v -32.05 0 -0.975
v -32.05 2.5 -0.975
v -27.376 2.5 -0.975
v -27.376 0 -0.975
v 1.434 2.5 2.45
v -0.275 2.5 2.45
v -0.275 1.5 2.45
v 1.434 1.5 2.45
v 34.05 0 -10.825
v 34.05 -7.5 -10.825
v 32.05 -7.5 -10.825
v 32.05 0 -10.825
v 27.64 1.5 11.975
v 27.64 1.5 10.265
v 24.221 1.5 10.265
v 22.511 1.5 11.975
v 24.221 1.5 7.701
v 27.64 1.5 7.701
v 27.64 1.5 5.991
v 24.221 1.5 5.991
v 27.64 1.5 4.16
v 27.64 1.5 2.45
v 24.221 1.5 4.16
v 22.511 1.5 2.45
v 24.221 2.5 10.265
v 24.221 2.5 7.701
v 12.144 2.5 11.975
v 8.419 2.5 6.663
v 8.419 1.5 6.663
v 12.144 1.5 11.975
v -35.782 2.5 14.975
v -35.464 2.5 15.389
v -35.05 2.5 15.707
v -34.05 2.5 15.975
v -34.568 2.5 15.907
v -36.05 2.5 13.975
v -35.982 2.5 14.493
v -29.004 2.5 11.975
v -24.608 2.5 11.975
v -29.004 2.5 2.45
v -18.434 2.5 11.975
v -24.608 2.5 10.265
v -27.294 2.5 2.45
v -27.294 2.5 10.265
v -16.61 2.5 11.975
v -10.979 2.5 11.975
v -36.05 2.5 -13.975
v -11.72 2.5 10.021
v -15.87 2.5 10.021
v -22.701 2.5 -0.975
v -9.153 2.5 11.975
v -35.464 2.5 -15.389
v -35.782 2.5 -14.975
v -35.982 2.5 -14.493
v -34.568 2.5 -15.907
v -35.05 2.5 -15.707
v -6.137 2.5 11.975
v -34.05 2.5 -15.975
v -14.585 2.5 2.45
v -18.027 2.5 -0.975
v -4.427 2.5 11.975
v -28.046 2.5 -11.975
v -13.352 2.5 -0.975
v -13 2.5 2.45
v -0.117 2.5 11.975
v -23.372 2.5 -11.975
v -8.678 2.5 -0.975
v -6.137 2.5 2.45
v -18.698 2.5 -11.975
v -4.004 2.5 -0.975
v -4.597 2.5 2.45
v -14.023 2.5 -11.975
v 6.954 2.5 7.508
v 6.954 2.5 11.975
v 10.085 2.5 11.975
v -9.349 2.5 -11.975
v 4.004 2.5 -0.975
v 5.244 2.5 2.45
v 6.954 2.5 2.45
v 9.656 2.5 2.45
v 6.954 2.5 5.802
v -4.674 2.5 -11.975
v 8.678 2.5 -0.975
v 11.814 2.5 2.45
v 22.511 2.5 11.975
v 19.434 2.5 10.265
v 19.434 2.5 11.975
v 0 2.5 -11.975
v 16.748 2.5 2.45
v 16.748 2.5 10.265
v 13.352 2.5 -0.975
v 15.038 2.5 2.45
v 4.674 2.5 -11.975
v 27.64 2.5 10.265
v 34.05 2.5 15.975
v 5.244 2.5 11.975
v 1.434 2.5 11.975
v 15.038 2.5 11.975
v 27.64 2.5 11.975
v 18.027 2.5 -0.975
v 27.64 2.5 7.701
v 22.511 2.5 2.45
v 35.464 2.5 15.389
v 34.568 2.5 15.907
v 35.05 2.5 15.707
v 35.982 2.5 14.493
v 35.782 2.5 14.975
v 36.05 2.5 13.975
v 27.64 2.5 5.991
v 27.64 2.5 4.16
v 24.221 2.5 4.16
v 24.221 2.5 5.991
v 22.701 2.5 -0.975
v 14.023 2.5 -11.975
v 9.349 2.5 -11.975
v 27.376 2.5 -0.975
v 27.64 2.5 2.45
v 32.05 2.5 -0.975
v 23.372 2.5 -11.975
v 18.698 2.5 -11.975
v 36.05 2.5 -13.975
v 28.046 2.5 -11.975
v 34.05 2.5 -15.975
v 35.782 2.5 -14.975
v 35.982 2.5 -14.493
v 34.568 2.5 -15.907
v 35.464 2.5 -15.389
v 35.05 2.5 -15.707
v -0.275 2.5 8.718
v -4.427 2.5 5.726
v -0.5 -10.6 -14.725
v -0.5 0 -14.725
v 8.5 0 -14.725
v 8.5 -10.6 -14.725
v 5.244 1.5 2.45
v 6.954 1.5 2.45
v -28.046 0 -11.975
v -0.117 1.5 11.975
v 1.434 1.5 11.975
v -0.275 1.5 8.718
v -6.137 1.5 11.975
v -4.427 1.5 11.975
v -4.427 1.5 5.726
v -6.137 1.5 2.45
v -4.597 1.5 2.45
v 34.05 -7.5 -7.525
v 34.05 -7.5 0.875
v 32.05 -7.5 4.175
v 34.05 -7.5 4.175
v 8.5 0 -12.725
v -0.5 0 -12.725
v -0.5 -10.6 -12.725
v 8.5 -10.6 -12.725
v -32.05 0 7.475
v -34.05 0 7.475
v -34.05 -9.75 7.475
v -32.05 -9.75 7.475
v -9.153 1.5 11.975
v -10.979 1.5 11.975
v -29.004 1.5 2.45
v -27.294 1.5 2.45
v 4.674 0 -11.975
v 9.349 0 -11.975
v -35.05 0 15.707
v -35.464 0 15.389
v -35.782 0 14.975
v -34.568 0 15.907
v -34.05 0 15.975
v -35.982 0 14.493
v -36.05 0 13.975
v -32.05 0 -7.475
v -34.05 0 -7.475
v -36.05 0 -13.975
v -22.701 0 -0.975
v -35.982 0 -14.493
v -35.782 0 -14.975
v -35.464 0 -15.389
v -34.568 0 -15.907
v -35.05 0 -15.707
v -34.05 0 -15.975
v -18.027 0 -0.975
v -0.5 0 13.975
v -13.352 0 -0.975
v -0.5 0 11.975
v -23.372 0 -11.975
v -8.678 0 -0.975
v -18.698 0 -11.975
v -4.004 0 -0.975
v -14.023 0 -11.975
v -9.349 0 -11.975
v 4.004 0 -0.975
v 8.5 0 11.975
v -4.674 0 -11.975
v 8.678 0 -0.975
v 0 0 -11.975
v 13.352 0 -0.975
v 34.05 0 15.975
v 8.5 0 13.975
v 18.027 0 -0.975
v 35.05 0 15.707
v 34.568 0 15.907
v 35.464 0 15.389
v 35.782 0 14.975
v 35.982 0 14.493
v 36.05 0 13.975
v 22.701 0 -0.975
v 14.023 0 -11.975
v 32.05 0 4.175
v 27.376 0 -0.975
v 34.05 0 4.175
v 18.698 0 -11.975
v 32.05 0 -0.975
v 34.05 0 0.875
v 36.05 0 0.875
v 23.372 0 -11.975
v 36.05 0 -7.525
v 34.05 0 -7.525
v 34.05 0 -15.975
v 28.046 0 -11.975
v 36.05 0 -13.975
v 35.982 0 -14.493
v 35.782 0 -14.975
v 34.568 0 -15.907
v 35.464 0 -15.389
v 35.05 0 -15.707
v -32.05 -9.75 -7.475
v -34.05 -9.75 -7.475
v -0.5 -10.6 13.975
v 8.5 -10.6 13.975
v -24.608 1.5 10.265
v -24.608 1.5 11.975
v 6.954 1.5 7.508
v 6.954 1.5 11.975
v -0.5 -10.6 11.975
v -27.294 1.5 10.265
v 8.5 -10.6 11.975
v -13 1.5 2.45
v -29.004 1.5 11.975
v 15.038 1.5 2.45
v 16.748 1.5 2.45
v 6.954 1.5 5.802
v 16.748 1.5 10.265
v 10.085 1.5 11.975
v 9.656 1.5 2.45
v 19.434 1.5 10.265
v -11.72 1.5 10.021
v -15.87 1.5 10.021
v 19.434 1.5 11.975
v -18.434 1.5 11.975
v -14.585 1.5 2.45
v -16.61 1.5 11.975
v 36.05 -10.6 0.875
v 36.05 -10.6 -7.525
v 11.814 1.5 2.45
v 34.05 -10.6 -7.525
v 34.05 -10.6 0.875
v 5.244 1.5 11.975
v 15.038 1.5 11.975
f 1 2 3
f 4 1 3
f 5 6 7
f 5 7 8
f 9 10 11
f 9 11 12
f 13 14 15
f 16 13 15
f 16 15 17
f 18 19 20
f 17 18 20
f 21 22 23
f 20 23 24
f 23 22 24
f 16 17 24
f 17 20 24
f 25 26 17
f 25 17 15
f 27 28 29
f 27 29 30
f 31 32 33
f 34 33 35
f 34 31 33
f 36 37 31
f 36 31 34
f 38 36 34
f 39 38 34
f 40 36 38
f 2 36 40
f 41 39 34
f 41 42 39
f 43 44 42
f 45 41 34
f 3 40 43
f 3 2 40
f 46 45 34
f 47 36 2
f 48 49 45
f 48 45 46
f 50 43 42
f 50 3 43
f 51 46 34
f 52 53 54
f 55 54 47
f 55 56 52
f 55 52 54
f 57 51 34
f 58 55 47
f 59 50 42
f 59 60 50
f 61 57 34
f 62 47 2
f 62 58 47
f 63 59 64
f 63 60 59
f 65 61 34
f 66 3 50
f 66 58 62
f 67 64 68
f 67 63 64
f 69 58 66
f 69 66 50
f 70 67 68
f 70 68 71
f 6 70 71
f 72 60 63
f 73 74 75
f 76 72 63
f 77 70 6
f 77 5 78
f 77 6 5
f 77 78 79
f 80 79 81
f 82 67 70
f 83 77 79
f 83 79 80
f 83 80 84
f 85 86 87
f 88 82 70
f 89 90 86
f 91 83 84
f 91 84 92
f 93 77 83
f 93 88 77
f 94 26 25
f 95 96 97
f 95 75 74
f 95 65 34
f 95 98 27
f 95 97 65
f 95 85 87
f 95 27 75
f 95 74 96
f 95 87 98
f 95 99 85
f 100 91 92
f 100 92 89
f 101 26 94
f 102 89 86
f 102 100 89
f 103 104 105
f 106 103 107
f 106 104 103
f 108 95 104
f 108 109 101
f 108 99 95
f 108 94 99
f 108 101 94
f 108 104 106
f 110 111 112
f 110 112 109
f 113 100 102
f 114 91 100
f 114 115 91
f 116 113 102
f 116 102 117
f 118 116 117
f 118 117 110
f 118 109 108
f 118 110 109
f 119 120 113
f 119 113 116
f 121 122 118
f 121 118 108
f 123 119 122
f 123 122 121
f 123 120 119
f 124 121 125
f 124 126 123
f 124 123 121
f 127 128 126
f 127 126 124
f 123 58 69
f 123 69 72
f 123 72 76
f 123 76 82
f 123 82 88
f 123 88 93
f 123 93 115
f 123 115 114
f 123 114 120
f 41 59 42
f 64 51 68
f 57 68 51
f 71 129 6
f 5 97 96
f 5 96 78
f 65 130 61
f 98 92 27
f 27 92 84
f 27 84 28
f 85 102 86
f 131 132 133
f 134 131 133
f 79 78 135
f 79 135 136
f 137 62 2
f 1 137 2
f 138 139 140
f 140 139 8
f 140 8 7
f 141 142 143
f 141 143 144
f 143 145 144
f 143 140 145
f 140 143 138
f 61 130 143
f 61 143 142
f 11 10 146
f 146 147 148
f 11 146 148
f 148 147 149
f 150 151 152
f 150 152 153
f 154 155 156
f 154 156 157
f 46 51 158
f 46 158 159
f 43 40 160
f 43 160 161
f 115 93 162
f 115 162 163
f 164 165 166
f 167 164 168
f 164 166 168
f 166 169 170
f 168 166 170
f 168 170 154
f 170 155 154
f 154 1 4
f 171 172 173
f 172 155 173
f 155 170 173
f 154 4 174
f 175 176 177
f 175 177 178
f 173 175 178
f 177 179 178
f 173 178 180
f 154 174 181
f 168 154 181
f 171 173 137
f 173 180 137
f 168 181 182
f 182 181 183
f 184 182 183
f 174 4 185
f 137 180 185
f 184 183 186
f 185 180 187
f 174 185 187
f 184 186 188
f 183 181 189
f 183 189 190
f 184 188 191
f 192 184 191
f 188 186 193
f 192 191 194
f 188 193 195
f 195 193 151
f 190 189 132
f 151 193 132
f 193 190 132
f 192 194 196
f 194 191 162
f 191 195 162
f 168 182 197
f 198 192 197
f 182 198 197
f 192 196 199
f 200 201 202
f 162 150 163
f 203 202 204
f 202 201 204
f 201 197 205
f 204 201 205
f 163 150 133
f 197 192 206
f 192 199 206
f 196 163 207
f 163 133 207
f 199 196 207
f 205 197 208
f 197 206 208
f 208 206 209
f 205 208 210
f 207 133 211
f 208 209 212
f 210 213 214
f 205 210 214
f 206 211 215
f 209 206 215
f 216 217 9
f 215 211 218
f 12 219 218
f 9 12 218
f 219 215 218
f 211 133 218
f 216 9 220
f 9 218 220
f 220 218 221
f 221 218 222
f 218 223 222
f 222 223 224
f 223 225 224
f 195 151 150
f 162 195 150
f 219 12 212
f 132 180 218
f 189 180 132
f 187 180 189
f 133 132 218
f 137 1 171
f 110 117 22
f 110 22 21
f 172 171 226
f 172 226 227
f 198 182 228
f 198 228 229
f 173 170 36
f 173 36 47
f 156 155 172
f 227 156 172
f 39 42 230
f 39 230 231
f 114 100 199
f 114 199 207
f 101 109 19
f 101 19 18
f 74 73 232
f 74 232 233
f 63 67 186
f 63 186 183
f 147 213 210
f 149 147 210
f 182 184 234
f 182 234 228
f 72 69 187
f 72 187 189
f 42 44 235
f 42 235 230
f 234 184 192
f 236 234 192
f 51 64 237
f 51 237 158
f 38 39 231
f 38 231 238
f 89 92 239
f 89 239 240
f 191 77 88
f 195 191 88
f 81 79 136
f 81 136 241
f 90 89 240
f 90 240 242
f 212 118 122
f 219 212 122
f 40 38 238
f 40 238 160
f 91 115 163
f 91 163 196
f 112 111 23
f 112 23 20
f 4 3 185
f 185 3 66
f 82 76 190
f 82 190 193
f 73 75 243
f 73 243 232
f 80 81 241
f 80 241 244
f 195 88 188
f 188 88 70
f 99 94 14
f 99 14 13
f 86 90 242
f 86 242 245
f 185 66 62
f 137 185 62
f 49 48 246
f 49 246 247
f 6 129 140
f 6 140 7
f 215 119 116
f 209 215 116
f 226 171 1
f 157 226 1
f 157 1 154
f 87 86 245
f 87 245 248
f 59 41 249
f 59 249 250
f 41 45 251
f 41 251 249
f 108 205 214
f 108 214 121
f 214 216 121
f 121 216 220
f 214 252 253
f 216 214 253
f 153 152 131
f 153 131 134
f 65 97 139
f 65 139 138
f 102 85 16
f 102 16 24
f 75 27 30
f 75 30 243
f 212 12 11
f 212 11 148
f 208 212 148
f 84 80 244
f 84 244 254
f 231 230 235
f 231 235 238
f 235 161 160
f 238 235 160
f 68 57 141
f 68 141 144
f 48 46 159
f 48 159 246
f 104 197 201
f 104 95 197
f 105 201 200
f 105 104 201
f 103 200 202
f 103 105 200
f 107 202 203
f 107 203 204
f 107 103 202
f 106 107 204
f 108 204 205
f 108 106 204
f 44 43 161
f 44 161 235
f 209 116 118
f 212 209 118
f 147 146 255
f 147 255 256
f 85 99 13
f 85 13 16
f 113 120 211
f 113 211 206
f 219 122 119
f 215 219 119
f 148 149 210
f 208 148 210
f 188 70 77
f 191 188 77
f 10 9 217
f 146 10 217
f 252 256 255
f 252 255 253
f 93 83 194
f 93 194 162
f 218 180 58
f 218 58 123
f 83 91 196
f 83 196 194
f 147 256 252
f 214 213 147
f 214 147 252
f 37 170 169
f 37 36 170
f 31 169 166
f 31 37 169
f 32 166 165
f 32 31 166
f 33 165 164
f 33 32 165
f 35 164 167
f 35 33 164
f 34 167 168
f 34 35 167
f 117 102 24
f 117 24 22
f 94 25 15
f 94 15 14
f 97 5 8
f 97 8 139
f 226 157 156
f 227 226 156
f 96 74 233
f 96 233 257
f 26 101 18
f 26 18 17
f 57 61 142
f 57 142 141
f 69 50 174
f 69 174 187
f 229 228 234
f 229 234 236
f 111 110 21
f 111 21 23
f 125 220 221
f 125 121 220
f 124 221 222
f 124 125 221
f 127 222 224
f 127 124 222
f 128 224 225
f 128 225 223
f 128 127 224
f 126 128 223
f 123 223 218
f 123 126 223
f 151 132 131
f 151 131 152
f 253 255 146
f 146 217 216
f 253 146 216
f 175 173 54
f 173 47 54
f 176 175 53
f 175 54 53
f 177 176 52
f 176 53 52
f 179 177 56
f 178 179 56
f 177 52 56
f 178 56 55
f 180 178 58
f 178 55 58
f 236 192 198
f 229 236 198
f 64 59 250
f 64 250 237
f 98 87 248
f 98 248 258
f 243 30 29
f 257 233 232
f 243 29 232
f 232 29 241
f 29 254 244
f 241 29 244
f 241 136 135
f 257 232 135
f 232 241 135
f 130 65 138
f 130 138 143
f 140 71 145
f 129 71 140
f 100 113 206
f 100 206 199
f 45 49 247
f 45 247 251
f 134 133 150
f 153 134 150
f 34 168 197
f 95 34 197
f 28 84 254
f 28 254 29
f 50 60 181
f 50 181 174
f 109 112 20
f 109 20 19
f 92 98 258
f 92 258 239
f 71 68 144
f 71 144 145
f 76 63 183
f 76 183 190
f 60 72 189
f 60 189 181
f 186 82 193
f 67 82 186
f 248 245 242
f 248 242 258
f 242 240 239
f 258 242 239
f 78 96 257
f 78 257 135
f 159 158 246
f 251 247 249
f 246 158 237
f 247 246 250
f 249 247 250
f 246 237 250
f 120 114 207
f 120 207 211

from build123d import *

# Parameters (mm, degrees)
SKETCH1_W           = 72.1
SKETCH1_H           = 31.95
BOSS_EXTRUDE1_DEPTH = 2.5
FILLET1_R           = 2
SKETCH2_W           = 2
SKETCH2_H           = 8.4
SKETCH2_W_2         = 9
SKETCH2_H_2         = 2
BOSS_EXTRUDE2_DEPTH = 10.6
BOSS_EXTRUDE4_DEPTH = 9.75
CUT_EXTRUDE1_DEPTH  = 2.5
CUT_EXTRUDE2_DEPTH  = 1
CUT_EXTRUDE4_DEPTH  = 1
SKETCH8_W           = 15
SKETCH8_H           = 7.5
BOSS_EXTRUDE5_DEPTH = 2


with BuildPart() as part:
    # Sketch1 → Boss-Extrude1 (new body)
    with BuildSketch(Plane(origin=(0, 0, 0), x_dir=(1, 0, 0), z_dir=(0, 1, 0))):
        Rectangle(SKETCH1_W, SKETCH1_H)
    extrude(amount=BOSS_EXTRUDE1_DEPTH)

    # Fillet1
    fillet1_edges = [part.edges().sort_by_distance(p)[0] for p in [
        (36.05, 1.25, 15.975),
        (-36.05, 1.25, 15.975),
        (-36.05, 1.25, -15.975),
        (36.05, 1.25, -15.975),
    ]]
    fillet(fillet1_edges, radius=FILLET1_R)

    # Sketch2 → Boss-Extrude2 (add)
    with BuildSketch(Plane.XZ):
        with Locations((35.05, -3.325)):
            Rectangle(SKETCH2_W, SKETCH2_H)
        with Locations((4, -13.725)):
            Rectangle(SKETCH2_W_2, SKETCH2_H_2)
        with Locations((4, 12.975)):
            Rectangle(SKETCH2_W_2, SKETCH2_H_2)
    extrude(amount=BOSS_EXTRUDE2_DEPTH)

    # Sketch2<3> → Boss-Extrude4 (add)
    with BuildSketch(Plane.XZ):
        Polygon((-32.05, 7.475), (-32.05, -0.925), (-32.05, -7.475), (-34.05, -7.475), (-34.05, -0.925), (-34.05, 7.475), align=None)
    extrude(amount=BOSS_EXTRUDE4_DEPTH)

    # Sketch4 → Cut-Extrude1 (cut)
    with BuildSketch(Plane(origin=(0, 2.5, 0), x_dir=(1, 0, 0), z_dir=(0, 1, 0))):
        Polygon((-32.05, 0.975), (-27.375612096, 0.975), (-23.371939519, 11.975), (-28.046327423, 11.975), align=None)
        Polygon((-22.701224192, 0.975), (-18.697551615, 11.975), (-14.023163712, 11.975), (-18.026836288, 0.975), align=None)
        Polygon((-13.352448385, 0.975), (-9.348775808, 11.975), (-4.674387904, 11.975), (-8.678060481, 0.975), align=None)
        Polygon((0, 11.975), (-4.003672577, 0.975), (4.003672577, 0.975), align=None)
        Polygon((8.678060481, 0.975), (4.674387904, 11.975), (9.348775808, 11.975), (13.352448385, 0.975), align=None)
        Polygon((18.026836288, 0.975), (14.023163712, 11.975), (18.697551615, 11.975), (22.701224192, 0.975), align=None)
        Polygon((23.371939519, 11.975), (27.375612096, 0.975), (32.05, 0.975), (28.046327423, 11.975), align=None)
    extrude(amount=-CUT_EXTRUDE1_DEPTH, mode=Mode.SUBTRACT)

    # Sketch3 → Cut-Extrude2 (cut)
    # profile 1 of 6: a face of its own
    with BuildSketch(Plane(origin=(0, 2.5, 0), x_dir=(1, 0, 0), z_dir=(0, 1, 0))):
        Polygon((-29.003846154, -2.45), (-27.294230769, -2.45), (-27.294230769, -10.265384615), (-24.607692308, -10.265384615), (-24.607692308, -11.975), (-29.003846154, -11.975), align=None)
    # profile 2 of 6: a face of its own
    with BuildSketch(Plane(origin=(0, 2.5, 0), x_dir=(1, 0, 0), z_dir=(0, 1, 0))):
        Polygon((-14.585399639, -2.45), (-12.999807692, -2.45), (-9.153173077, -11.975), (-10.979179687, -11.975), (-11.719504207, -10.021153846), (-15.869519231, -10.021153846), (-16.60984375, -11.975), (-18.433942308, -11.975), align=None)
        Polygon((-13.793557692, -5.004882812), (-15.22078125, -8.311538462), (-12.366334135, -8.311538462), align=None, mode=Mode.SUBTRACT)
    # profile 3 of 6: a face of its own
    with BuildSketch(Plane(origin=(0, 2.5, 0), x_dir=(1, 0, 0), z_dir=(0, 1, 0))):
        Polygon((-6.136923077, -2.45), (-4.597124399, -2.45), (-0.275384615, -8.717953726), (-0.275384615, -2.45), (1.434230769, -2.45), (1.434230769, -11.975), (-0.117016226, -11.975), (-4.427307692, -5.726126803), (-4.427307692, -11.975), (-6.136923077, -11.975), align=None)
    # profile 4 of 6: a face of its own
    with BuildSketch(Plane(origin=(0, 2.5, 0), x_dir=(1, 0, 0), z_dir=(0, 1, 0))):
        Polygon((5.244230769, -2.45), (6.953846154, -2.45), (6.953846154, -5.802448918), (9.655649038, -2.45), (11.813656851, -2.45), (8.419230769, -6.662980769), (12.14375, -11.975), (10.084960938, -11.975), (6.953846154, -7.508248197), (6.953846154, -11.975), (5.244230769, -11.975), align=None)
    # profile 5 of 6: a face of its own
    with BuildSketch(Plane(origin=(0, 2.5, 0), x_dir=(1, 0, 0), z_dir=(0, 1, 0))):
        Polygon((15.037884615, -2.45), (16.7475, -2.45), (16.7475, -10.265384615), (19.434038462, -10.265384615), (19.434038462, -11.975), (15.037884615, -11.975), align=None)
    # profile 6 of 6: a face of its own
    with BuildSketch(Plane(origin=(0, 2.5, 0), x_dir=(1, 0, 0), z_dir=(0, 1, 0))):
        Polygon((22.511346154, -2.45), (27.640192308, -2.45), (27.640192308, -4.159615385), (24.220961538, -4.159615385), (24.220961538, -5.991346154), (27.640192308, -5.991346154), (27.640192308, -7.700961538), (24.220961538, -7.700961538), (24.220961538, -10.265384615), (27.640192308, -10.265384615), (27.640192308, -11.975), (22.511346154, -11.975), align=None)
    extrude(amount=-CUT_EXTRUDE2_DEPTH, mode=Mode.SUBTRACT)

    # Sketch7 → Cut-Extrude4 (cut)
    with BuildSketch(Plane(origin=(0, 2.5, 0), x_dir=(1, 0, 0), z_dir=(0, 1, 0))):
        Polygon((-12.366334135, -8.311538462), (-13.793557692, -5.004882812), (-15.22078125, -8.311538462), align=None)
    extrude(amount=-CUT_EXTRUDE4_DEPTH, mode=Mode.SUBTRACT)

    # Sketch8 → Boss-Extrude5 (add)
    with BuildSketch(Plane.ZY.offset(-34.05)):
        with Locations((-3.325, -3.75)):
            Rectangle(SKETCH8_W, SKETCH8_H)
    extrude(amount=BOSS_EXTRUDE5_DEPTH)


solid = part.part
